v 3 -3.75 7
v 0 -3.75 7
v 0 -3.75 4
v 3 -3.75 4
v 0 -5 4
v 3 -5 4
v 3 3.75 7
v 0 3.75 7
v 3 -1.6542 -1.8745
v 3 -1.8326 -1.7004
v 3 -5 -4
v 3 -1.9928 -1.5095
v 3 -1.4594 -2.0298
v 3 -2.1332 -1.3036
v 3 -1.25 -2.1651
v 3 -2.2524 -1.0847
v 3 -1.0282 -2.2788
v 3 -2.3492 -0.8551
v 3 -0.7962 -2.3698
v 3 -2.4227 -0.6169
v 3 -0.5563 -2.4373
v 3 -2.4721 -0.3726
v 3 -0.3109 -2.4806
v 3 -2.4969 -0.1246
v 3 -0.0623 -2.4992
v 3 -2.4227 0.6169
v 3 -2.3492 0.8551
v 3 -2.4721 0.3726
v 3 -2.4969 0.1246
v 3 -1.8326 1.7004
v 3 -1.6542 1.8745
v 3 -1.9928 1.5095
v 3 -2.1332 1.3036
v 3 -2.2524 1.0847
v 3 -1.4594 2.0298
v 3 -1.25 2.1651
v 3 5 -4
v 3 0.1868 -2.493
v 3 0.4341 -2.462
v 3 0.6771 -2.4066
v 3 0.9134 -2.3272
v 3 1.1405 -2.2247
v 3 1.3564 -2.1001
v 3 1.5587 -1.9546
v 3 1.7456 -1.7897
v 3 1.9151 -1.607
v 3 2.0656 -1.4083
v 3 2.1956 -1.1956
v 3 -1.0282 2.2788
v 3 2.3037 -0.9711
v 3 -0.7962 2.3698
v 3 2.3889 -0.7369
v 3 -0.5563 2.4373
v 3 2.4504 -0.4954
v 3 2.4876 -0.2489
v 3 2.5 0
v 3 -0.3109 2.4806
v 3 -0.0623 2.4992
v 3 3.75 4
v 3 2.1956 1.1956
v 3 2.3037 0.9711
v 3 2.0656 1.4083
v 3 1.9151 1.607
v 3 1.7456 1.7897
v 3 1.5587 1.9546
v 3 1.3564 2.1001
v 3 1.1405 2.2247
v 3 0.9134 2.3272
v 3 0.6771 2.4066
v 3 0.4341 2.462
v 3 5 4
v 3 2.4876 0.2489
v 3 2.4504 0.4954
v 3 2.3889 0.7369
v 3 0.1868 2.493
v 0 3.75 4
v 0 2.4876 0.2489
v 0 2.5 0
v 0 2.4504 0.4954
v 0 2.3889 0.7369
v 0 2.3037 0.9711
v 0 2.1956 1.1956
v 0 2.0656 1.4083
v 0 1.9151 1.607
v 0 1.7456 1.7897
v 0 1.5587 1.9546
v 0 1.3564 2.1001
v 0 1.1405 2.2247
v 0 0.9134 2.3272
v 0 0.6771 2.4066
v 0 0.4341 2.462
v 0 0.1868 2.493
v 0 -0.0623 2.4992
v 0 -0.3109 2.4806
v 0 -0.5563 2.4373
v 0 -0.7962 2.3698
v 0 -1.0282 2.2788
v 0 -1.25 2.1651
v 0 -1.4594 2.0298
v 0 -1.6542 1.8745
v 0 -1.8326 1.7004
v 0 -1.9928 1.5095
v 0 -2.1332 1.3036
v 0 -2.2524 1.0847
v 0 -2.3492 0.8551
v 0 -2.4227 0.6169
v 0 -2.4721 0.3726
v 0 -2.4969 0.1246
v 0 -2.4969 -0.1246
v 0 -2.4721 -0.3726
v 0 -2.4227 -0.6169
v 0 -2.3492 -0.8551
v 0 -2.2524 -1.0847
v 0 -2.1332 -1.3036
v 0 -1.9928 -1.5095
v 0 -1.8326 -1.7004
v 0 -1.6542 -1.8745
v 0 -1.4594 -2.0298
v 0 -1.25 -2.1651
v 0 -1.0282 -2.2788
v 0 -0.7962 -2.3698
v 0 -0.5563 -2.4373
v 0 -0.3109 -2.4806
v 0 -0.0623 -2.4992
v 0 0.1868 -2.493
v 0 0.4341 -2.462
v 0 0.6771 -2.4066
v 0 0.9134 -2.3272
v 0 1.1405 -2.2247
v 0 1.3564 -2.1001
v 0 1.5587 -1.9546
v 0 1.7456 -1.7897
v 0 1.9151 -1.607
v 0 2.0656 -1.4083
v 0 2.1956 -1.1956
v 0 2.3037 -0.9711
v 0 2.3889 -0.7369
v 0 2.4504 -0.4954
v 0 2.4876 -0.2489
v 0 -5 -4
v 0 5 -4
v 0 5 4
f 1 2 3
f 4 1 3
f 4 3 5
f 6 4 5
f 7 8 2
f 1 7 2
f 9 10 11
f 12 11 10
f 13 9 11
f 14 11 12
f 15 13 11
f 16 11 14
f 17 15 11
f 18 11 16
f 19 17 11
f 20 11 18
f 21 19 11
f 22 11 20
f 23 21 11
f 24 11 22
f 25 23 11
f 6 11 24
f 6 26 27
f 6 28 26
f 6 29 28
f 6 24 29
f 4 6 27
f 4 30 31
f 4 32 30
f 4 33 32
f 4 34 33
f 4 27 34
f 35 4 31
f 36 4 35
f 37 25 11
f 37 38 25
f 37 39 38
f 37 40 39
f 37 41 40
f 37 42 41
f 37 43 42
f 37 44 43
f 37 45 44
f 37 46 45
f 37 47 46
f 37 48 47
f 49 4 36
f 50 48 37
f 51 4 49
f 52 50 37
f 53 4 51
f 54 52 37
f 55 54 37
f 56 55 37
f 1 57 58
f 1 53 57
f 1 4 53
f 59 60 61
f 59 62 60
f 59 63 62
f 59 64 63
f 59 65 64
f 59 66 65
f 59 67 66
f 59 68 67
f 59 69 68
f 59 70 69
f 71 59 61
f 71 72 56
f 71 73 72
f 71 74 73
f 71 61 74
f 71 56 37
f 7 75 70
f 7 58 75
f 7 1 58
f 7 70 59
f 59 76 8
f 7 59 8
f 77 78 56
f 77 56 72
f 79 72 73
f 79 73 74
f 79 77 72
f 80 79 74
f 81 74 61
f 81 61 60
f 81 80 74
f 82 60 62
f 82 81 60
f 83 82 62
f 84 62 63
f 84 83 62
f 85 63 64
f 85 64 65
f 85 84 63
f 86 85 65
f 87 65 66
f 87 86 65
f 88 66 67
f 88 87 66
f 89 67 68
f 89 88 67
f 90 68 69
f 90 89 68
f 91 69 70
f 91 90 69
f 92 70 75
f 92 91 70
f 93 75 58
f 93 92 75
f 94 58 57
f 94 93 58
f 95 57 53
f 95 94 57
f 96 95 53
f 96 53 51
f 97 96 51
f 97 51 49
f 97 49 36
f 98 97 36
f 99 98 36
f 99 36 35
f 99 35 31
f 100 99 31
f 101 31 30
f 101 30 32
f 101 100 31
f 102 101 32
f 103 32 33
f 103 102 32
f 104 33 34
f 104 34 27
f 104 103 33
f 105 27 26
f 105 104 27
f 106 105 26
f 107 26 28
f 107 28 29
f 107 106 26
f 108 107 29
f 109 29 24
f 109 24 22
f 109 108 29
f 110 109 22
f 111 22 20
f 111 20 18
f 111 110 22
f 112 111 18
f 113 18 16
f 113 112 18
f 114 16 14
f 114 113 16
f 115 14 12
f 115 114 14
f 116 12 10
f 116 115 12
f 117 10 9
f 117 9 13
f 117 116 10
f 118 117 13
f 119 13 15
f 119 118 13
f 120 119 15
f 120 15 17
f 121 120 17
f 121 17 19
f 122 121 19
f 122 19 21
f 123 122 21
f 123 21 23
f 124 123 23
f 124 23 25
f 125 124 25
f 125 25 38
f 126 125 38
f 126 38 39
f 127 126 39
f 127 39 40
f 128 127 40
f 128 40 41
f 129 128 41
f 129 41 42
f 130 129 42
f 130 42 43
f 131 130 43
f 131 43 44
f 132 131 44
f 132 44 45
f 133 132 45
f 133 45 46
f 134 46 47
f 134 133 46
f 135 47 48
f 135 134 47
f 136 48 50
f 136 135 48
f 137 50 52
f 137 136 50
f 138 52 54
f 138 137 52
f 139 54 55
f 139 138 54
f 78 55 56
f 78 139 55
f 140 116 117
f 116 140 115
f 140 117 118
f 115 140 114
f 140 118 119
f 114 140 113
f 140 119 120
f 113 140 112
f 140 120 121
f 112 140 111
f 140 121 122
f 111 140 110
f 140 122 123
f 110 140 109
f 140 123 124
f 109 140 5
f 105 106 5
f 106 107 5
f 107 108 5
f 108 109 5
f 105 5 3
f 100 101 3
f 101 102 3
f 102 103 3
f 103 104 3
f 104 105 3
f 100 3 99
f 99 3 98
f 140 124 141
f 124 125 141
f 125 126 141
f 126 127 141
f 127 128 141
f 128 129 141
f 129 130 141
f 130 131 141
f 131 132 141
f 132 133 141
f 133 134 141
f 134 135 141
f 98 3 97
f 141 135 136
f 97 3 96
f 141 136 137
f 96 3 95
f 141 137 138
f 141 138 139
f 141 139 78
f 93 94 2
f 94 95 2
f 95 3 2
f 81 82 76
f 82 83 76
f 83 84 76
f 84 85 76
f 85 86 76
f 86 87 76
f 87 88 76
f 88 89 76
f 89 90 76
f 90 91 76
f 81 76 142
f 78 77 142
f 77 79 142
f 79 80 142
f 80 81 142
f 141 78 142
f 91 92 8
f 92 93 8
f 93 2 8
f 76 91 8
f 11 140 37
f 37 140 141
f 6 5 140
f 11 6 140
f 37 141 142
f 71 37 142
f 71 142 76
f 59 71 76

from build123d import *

# Parameters (mm, degrees)
F0_R     = 2.5
F1_DEPTH = 3


with BuildPart() as f1:
    # F0 (on Right) → F1 (new body)
    with BuildSketch(Plane.YZ):
        Polygon((-5, 4), (-5, -4), (5, -4), (5, 4), (3.75, 4), (3.75, 7), (-3.75, 7), (-3.75, 4), align=None)
        Circle(F0_R, mode=Mode.SUBTRACT)
    extrude(amount=F1_DEPTH)


solid = f1.part
